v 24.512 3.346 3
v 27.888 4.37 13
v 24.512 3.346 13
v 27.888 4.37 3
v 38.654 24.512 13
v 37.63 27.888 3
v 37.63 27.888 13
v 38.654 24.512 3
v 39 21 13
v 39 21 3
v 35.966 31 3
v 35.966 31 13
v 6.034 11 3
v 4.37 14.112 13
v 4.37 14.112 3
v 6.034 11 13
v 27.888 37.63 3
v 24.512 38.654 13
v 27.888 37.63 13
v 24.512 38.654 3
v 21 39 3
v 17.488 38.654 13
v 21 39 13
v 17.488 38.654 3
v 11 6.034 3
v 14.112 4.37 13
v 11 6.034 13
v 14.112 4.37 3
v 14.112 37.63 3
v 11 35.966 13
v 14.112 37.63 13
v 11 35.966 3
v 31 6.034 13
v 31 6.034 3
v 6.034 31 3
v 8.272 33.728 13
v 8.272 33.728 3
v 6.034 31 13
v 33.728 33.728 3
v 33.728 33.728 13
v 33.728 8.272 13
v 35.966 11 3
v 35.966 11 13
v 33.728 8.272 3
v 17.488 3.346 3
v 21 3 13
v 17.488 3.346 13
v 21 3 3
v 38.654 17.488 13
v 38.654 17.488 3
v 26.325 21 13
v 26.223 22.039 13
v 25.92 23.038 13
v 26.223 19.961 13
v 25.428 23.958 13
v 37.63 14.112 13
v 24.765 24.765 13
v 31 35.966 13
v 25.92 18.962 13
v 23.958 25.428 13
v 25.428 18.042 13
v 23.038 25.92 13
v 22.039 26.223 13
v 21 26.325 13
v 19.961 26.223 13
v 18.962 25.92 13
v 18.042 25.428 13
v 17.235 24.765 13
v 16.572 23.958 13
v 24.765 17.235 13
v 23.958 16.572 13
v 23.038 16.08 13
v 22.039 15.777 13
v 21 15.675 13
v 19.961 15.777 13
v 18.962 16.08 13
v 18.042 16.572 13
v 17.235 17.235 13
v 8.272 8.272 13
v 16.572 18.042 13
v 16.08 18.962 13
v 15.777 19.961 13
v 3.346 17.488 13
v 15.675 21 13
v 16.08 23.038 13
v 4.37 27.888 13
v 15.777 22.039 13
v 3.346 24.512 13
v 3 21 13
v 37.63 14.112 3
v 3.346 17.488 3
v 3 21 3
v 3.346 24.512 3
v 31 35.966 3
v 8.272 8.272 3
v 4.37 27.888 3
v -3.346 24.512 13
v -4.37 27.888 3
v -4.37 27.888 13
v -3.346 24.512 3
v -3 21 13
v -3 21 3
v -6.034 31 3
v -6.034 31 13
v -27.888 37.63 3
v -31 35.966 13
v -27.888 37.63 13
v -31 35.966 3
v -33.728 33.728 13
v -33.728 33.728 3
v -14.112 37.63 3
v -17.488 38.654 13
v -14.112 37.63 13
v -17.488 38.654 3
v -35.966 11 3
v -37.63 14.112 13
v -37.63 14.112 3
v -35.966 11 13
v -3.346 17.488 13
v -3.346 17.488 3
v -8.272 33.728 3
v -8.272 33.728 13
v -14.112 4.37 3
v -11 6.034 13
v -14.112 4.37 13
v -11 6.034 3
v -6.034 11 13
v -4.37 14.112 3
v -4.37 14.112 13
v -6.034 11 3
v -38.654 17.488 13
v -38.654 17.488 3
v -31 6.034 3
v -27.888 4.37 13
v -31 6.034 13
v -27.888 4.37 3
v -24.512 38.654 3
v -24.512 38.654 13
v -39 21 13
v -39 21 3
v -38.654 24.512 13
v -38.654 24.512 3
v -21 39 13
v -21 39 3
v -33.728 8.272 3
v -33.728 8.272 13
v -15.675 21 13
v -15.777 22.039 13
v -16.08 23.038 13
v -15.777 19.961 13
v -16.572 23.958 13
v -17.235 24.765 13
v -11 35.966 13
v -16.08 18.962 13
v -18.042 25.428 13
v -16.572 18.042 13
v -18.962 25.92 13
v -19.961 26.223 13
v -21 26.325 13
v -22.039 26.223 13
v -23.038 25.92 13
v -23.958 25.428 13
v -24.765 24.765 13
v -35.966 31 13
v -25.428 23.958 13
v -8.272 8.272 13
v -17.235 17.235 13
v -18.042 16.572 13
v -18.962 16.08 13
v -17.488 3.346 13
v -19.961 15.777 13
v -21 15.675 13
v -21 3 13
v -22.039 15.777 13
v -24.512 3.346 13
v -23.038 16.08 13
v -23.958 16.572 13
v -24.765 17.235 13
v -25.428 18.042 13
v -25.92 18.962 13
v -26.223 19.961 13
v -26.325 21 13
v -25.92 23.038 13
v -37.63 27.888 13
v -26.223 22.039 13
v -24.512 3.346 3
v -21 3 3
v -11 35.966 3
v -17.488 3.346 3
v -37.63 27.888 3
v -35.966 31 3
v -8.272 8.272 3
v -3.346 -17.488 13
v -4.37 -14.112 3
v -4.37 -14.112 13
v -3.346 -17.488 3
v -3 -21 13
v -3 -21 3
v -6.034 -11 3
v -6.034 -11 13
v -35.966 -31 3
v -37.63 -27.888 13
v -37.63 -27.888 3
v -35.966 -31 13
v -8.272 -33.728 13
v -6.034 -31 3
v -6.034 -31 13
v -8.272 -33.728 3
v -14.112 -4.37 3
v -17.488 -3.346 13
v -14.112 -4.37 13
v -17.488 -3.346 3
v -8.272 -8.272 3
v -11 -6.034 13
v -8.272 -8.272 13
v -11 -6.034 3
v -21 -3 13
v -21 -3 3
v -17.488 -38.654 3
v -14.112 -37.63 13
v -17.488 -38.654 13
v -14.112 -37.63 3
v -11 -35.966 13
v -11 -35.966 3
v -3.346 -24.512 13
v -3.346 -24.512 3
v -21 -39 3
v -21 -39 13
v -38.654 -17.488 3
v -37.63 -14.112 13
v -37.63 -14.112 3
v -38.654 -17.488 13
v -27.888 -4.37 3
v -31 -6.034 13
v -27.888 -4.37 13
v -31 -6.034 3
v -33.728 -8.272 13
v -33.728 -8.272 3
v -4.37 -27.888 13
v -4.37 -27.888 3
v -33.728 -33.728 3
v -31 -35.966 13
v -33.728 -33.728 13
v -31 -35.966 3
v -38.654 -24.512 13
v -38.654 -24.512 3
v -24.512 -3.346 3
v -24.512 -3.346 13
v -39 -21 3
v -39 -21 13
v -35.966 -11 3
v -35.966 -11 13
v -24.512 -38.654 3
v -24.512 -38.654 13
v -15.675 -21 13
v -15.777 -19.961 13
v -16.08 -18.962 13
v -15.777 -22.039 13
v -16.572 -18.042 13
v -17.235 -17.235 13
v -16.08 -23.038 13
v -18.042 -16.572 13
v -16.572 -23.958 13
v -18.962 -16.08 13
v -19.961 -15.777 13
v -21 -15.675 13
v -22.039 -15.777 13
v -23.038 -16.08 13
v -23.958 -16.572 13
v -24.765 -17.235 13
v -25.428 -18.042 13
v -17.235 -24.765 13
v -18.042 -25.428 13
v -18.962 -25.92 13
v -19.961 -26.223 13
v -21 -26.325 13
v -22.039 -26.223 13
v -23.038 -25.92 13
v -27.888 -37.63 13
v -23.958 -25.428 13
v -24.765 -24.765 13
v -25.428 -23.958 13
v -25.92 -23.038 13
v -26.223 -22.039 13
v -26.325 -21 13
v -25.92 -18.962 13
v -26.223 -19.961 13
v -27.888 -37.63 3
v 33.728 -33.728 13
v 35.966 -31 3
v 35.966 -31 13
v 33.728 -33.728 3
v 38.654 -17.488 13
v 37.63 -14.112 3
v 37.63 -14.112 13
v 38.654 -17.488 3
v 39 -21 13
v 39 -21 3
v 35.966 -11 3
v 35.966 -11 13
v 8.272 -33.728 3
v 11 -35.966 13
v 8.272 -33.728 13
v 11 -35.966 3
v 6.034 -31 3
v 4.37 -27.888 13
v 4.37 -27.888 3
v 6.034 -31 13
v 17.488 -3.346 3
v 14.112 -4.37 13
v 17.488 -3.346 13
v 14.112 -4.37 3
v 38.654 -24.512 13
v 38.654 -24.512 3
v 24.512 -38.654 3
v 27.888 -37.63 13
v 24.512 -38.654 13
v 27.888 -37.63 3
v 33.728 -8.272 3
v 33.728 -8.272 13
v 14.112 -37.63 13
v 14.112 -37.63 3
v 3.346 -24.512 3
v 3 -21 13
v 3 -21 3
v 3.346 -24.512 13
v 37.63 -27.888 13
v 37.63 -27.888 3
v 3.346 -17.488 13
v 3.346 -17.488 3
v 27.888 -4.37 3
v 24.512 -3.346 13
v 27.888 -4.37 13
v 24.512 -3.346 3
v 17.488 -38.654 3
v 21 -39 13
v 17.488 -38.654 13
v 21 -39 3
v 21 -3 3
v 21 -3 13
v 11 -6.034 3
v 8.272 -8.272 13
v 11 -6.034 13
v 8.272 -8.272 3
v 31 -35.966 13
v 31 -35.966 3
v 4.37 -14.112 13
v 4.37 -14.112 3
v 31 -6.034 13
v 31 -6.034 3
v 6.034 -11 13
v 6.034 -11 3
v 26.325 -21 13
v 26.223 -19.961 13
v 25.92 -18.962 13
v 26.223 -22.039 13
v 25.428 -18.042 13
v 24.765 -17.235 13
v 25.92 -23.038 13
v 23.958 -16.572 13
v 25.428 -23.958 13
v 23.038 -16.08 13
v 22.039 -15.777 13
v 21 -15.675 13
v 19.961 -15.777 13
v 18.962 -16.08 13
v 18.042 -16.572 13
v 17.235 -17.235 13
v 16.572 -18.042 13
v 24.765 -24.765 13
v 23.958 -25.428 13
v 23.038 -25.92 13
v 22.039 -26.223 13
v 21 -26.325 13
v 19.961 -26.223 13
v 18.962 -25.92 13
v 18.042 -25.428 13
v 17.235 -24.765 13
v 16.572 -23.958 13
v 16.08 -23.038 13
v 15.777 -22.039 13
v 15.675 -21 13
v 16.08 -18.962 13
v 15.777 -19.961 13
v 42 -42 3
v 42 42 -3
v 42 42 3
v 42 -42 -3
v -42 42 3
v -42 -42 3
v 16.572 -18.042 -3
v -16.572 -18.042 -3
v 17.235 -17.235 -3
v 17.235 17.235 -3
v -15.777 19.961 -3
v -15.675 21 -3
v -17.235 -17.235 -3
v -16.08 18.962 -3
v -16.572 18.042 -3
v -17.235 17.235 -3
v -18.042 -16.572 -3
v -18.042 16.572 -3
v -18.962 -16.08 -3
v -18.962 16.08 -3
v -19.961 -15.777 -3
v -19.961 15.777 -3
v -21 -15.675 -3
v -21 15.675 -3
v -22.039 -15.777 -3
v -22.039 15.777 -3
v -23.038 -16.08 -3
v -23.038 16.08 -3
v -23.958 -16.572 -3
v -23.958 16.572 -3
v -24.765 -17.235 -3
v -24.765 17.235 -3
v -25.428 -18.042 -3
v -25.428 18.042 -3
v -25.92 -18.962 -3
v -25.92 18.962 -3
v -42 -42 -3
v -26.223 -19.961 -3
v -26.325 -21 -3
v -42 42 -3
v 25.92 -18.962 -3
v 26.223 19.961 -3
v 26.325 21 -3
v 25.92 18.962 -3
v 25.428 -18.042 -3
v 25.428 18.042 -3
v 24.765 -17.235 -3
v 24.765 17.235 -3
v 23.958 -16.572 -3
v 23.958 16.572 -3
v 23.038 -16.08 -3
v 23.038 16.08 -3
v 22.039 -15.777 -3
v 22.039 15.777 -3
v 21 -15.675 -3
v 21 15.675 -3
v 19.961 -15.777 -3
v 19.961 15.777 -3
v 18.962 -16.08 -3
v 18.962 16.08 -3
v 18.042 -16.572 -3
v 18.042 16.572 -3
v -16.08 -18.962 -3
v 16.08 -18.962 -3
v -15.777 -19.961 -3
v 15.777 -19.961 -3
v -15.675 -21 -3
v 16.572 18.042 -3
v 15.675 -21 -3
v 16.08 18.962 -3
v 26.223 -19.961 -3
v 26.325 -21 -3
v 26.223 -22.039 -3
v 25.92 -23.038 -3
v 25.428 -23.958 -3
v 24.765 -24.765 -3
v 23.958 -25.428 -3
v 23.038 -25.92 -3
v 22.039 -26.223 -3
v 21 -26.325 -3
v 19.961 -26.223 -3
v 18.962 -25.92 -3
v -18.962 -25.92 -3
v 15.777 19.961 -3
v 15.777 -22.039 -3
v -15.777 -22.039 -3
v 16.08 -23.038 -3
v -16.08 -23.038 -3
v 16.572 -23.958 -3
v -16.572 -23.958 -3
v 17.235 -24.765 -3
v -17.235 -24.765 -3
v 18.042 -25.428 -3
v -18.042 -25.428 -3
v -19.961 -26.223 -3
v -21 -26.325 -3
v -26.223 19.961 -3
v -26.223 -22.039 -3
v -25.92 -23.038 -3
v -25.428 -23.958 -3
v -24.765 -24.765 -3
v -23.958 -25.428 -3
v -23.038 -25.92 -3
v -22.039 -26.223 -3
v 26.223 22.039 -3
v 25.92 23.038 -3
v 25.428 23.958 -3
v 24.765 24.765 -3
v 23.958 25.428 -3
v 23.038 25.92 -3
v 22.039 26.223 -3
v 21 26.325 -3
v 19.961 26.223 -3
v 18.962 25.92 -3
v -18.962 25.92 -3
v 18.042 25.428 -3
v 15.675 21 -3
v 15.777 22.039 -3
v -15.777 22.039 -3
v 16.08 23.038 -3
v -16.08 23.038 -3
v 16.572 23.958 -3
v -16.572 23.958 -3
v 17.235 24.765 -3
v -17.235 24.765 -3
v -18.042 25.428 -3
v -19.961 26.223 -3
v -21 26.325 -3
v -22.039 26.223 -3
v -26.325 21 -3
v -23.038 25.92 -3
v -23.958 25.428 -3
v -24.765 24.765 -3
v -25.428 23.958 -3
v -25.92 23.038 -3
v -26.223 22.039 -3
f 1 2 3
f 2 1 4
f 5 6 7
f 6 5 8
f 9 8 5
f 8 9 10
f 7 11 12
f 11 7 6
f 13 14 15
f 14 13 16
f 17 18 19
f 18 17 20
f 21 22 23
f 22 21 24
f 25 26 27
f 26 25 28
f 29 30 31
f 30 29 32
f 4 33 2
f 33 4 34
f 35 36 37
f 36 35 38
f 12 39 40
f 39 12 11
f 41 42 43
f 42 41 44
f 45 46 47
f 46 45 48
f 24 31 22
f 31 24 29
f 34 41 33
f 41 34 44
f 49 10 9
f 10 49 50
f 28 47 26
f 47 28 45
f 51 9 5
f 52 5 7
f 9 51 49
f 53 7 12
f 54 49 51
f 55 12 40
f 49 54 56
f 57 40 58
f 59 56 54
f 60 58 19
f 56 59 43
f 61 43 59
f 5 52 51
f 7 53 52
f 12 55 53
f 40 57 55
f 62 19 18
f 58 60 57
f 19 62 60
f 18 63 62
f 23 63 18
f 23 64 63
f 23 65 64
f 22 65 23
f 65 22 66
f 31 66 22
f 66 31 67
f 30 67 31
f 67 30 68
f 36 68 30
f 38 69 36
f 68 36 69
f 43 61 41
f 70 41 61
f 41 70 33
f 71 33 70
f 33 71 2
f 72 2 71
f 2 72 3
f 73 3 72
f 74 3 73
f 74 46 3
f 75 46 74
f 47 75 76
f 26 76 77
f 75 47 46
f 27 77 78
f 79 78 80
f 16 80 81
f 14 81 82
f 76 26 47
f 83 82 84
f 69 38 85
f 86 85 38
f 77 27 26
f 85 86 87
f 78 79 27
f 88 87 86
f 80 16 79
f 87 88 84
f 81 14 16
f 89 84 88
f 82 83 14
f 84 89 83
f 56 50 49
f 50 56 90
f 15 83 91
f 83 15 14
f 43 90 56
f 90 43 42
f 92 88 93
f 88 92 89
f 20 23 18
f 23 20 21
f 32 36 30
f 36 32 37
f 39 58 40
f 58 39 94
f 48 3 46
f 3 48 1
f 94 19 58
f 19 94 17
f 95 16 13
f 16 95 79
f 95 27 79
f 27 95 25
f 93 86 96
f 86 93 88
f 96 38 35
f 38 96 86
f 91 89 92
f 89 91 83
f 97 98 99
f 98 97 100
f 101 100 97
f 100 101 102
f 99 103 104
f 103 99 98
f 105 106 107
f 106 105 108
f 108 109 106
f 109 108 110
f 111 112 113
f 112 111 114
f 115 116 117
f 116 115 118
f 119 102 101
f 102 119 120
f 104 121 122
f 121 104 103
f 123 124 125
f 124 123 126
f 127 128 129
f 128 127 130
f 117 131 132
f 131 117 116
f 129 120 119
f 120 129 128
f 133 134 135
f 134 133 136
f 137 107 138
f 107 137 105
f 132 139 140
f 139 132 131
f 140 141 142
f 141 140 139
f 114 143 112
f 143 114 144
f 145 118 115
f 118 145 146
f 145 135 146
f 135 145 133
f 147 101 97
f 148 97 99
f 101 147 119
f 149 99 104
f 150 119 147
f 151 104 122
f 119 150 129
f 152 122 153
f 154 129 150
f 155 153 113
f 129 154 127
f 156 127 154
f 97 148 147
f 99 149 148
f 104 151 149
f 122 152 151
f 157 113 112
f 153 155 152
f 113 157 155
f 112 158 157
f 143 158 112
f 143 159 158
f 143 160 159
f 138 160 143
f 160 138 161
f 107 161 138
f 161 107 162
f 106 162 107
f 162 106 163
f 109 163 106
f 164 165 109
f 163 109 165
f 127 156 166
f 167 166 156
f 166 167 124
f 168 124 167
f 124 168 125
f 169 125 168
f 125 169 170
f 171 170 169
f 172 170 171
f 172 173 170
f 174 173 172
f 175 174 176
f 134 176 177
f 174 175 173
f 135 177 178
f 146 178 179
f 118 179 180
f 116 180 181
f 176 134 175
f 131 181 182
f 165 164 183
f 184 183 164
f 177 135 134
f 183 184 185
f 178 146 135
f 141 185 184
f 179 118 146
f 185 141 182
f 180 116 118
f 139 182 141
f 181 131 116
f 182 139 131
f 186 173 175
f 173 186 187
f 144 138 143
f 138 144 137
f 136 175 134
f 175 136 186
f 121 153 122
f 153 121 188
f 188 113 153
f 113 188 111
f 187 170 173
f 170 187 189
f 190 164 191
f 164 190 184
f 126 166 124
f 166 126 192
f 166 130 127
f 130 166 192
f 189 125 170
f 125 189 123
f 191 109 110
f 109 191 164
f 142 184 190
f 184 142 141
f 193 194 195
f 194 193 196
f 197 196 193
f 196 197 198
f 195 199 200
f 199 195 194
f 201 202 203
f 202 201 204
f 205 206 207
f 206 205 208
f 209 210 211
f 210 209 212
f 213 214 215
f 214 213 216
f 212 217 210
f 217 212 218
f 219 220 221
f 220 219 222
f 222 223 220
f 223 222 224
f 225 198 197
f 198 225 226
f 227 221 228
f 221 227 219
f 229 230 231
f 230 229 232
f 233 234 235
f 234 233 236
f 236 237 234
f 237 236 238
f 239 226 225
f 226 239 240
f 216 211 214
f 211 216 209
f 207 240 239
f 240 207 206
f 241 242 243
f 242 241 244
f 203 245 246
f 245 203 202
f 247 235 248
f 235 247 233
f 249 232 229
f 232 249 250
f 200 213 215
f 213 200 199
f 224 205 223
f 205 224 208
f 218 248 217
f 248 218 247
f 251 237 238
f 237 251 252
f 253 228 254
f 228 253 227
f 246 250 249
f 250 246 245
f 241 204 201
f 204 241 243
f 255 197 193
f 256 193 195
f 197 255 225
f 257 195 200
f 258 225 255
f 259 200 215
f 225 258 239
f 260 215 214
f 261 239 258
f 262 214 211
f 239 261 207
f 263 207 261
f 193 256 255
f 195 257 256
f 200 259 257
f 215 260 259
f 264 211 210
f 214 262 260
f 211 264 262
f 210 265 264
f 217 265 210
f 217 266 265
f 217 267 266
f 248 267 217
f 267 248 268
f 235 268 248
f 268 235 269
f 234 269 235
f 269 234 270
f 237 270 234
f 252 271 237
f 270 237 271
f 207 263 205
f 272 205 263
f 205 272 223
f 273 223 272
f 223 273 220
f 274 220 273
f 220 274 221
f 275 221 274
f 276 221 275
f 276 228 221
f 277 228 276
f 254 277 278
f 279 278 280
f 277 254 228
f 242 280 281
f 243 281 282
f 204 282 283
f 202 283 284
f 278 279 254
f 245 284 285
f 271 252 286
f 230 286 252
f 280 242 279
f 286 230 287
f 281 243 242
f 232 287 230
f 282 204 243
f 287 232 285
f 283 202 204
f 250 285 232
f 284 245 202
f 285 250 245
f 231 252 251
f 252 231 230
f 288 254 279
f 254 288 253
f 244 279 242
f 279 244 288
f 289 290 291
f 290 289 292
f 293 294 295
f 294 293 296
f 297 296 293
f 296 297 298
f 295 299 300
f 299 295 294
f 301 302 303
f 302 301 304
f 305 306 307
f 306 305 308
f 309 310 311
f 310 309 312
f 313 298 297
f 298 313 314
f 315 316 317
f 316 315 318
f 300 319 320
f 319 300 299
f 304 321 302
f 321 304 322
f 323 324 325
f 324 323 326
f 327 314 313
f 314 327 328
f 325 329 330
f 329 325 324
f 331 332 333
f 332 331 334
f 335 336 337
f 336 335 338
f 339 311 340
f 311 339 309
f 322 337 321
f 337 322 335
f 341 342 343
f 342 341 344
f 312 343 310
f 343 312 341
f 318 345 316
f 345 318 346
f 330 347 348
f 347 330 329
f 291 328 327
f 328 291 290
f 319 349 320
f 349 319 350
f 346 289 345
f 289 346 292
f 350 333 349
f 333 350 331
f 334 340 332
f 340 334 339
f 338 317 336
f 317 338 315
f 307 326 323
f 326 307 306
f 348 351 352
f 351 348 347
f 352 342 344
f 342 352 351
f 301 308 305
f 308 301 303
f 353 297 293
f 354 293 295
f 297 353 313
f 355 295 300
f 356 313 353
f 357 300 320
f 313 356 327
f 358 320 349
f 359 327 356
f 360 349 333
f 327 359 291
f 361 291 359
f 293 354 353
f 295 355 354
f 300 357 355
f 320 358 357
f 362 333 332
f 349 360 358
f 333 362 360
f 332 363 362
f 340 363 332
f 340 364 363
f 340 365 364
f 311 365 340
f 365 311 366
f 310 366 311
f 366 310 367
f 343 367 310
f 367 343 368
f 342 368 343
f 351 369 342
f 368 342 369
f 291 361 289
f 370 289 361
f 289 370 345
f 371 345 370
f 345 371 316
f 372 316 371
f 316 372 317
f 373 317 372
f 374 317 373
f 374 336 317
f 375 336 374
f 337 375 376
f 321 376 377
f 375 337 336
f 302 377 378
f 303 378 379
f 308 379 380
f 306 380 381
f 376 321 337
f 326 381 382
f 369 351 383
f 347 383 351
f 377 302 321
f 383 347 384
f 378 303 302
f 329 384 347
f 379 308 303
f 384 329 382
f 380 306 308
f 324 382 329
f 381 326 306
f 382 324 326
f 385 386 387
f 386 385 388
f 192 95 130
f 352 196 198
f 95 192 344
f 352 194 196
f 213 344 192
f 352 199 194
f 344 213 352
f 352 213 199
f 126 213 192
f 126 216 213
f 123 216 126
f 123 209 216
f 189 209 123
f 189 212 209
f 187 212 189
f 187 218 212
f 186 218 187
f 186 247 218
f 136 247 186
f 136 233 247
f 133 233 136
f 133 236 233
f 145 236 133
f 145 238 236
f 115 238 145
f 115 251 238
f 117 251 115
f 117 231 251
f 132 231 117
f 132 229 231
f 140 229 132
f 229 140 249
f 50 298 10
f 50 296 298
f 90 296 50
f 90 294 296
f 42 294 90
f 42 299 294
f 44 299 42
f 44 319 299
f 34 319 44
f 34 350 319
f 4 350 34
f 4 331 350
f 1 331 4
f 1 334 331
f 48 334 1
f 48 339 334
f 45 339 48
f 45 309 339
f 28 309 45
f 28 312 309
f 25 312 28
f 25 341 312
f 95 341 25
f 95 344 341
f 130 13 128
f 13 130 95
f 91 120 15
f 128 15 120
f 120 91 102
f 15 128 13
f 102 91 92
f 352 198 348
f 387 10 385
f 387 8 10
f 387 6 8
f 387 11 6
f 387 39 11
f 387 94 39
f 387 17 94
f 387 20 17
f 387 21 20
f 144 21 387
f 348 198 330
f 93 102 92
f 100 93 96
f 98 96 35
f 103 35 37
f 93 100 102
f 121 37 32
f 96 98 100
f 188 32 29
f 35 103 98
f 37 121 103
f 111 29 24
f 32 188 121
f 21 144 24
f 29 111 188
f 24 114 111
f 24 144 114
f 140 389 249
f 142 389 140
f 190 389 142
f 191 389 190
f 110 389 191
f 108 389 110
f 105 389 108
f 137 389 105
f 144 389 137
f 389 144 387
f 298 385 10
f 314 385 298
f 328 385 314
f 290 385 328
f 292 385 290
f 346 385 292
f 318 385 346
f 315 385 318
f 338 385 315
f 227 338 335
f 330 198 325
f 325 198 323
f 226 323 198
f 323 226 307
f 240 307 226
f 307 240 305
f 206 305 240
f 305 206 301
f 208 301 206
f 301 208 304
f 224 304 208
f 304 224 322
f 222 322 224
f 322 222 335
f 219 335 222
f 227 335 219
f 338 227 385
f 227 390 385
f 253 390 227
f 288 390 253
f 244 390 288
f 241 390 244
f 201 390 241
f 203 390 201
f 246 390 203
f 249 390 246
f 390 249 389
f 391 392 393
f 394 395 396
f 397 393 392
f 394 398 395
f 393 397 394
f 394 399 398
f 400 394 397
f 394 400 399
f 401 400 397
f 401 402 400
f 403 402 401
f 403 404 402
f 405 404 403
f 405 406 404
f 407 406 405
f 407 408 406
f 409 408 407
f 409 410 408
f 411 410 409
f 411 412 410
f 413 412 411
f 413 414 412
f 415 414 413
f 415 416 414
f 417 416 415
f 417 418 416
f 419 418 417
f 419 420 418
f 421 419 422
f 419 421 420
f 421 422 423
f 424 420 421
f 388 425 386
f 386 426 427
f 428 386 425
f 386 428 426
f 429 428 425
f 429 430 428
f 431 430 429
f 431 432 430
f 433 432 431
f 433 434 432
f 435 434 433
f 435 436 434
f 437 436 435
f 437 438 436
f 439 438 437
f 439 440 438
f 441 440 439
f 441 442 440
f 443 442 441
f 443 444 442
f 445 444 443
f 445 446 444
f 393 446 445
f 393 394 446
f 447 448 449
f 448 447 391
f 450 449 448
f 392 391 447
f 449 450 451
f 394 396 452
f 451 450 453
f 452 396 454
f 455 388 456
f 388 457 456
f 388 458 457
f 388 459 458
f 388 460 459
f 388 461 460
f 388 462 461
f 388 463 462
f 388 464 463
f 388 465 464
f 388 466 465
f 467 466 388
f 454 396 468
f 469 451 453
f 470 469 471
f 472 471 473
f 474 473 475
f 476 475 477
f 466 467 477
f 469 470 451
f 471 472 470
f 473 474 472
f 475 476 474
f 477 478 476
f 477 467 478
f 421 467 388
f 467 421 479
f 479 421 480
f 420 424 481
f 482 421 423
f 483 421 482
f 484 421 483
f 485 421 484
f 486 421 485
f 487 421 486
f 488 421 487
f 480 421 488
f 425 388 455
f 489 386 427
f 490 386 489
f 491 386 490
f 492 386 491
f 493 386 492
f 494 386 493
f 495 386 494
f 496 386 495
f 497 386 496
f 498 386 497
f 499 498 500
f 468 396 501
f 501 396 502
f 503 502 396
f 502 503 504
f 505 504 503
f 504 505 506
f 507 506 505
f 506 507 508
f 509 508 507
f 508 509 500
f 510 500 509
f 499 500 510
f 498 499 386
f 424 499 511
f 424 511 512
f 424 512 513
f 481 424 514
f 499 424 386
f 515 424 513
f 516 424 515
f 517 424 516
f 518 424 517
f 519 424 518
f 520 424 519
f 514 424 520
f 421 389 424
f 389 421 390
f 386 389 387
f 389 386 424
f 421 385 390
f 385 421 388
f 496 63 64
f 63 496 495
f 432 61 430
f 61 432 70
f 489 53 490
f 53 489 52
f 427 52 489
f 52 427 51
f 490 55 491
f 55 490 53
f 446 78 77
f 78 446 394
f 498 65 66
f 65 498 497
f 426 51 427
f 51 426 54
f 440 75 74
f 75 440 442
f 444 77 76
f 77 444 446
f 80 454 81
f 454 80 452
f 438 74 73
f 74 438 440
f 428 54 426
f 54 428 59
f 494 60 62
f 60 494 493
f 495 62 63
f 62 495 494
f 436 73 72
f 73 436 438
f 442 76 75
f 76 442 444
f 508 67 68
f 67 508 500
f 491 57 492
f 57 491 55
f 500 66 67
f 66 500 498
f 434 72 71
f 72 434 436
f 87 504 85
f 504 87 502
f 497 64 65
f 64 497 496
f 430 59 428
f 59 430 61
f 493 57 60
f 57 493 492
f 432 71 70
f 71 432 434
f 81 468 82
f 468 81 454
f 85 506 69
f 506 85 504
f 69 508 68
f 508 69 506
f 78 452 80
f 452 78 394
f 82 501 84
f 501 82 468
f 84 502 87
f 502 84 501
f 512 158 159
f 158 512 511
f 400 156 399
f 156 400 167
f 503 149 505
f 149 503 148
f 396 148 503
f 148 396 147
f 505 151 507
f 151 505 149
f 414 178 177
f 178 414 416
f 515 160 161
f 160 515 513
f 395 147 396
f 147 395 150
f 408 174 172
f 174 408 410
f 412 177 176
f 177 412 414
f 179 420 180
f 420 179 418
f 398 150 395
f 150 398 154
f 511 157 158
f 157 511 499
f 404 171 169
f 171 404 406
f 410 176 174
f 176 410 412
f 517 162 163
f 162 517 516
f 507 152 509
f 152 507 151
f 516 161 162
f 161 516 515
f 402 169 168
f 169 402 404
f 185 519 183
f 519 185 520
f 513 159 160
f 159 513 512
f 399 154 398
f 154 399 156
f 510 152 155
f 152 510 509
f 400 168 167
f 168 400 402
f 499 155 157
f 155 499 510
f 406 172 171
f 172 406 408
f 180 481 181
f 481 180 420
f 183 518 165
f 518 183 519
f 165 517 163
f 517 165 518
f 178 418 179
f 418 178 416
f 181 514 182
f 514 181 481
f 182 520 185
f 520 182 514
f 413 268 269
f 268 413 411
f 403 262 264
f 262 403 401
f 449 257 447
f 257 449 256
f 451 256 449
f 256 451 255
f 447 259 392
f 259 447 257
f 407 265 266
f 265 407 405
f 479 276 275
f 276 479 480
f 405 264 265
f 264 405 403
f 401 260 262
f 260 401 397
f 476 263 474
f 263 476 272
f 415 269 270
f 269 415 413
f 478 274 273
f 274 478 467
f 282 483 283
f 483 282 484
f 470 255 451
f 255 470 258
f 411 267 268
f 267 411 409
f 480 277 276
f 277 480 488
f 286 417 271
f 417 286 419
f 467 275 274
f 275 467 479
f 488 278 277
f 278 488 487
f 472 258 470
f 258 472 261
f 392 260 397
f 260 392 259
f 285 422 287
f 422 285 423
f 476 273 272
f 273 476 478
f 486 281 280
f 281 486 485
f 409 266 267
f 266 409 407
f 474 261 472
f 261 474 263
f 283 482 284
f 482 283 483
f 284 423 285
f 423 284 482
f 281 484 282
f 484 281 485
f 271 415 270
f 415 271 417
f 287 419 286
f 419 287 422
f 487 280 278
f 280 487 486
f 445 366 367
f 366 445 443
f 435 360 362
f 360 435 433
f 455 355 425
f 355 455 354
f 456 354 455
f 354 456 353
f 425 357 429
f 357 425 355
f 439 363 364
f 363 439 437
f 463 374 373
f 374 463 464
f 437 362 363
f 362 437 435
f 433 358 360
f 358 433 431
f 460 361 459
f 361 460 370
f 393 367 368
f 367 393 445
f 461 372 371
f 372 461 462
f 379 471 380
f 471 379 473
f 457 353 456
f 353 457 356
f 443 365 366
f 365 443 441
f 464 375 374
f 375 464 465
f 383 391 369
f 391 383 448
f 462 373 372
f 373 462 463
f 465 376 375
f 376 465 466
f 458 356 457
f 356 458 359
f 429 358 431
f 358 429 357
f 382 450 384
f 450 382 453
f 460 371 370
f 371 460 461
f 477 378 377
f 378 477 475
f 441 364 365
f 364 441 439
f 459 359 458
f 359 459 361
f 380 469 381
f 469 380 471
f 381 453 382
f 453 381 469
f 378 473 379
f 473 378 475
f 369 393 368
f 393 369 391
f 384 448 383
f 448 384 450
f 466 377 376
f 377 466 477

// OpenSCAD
$fn = 32;

// ----------------------------------------------------------------------
// Anchor pads 84 x 84 x 16
// four corner bosses with anchor holes
// ----------------------------------------------------------------------

// --- parameters (mm) ---
plate = [84, 84, 6];     // base plate size (x, y, z)
pads = 4;                // boss count, one per corner
edge = 21;               // boss centre offset from the plate edge
boss_d = 36;             // boss diameter
boss_h = 10;             // boss height above the base plate
bore_d = 10.5;           // nominal hole diameter from the drawing
print_allowance = 0.15;  // clearance added for printing

// --- derived feature positions (mm) ---
hole_d = bore_d + print_allowance;  // = 10.65   hole diameter as printed
height = plate[2] + boss_h;         // = 16   overall height of the part
corner_x = plate[0] / 2 - edge;     // = 21   boss centre X
corner_y = plate[1] / 2 - edge;     // = 21   boss centre Y
feature_centers = [
  [corner_x, corner_y],
  [-corner_x, corner_y],
  [-corner_x, -corner_y],
  [corner_x, -corner_y]
];   // boss centres, anchor holes are drilled there

// base plate, four bosses standing on it, anchor holes all the way through
difference() {
  union() {
    cube(plate, center = true);
    for (centre = feature_centers)
      translate([centre[0], centre[1], plate[2] / 2 - 1])
        cylinder(d = boss_d, h = boss_h + 1);
  }
  for (centre = feature_centers)
    translate([centre[0], centre[1], -height])
      cylinder(d = hole_d, h = 2 * height + 2);  // through boss and plate
}
